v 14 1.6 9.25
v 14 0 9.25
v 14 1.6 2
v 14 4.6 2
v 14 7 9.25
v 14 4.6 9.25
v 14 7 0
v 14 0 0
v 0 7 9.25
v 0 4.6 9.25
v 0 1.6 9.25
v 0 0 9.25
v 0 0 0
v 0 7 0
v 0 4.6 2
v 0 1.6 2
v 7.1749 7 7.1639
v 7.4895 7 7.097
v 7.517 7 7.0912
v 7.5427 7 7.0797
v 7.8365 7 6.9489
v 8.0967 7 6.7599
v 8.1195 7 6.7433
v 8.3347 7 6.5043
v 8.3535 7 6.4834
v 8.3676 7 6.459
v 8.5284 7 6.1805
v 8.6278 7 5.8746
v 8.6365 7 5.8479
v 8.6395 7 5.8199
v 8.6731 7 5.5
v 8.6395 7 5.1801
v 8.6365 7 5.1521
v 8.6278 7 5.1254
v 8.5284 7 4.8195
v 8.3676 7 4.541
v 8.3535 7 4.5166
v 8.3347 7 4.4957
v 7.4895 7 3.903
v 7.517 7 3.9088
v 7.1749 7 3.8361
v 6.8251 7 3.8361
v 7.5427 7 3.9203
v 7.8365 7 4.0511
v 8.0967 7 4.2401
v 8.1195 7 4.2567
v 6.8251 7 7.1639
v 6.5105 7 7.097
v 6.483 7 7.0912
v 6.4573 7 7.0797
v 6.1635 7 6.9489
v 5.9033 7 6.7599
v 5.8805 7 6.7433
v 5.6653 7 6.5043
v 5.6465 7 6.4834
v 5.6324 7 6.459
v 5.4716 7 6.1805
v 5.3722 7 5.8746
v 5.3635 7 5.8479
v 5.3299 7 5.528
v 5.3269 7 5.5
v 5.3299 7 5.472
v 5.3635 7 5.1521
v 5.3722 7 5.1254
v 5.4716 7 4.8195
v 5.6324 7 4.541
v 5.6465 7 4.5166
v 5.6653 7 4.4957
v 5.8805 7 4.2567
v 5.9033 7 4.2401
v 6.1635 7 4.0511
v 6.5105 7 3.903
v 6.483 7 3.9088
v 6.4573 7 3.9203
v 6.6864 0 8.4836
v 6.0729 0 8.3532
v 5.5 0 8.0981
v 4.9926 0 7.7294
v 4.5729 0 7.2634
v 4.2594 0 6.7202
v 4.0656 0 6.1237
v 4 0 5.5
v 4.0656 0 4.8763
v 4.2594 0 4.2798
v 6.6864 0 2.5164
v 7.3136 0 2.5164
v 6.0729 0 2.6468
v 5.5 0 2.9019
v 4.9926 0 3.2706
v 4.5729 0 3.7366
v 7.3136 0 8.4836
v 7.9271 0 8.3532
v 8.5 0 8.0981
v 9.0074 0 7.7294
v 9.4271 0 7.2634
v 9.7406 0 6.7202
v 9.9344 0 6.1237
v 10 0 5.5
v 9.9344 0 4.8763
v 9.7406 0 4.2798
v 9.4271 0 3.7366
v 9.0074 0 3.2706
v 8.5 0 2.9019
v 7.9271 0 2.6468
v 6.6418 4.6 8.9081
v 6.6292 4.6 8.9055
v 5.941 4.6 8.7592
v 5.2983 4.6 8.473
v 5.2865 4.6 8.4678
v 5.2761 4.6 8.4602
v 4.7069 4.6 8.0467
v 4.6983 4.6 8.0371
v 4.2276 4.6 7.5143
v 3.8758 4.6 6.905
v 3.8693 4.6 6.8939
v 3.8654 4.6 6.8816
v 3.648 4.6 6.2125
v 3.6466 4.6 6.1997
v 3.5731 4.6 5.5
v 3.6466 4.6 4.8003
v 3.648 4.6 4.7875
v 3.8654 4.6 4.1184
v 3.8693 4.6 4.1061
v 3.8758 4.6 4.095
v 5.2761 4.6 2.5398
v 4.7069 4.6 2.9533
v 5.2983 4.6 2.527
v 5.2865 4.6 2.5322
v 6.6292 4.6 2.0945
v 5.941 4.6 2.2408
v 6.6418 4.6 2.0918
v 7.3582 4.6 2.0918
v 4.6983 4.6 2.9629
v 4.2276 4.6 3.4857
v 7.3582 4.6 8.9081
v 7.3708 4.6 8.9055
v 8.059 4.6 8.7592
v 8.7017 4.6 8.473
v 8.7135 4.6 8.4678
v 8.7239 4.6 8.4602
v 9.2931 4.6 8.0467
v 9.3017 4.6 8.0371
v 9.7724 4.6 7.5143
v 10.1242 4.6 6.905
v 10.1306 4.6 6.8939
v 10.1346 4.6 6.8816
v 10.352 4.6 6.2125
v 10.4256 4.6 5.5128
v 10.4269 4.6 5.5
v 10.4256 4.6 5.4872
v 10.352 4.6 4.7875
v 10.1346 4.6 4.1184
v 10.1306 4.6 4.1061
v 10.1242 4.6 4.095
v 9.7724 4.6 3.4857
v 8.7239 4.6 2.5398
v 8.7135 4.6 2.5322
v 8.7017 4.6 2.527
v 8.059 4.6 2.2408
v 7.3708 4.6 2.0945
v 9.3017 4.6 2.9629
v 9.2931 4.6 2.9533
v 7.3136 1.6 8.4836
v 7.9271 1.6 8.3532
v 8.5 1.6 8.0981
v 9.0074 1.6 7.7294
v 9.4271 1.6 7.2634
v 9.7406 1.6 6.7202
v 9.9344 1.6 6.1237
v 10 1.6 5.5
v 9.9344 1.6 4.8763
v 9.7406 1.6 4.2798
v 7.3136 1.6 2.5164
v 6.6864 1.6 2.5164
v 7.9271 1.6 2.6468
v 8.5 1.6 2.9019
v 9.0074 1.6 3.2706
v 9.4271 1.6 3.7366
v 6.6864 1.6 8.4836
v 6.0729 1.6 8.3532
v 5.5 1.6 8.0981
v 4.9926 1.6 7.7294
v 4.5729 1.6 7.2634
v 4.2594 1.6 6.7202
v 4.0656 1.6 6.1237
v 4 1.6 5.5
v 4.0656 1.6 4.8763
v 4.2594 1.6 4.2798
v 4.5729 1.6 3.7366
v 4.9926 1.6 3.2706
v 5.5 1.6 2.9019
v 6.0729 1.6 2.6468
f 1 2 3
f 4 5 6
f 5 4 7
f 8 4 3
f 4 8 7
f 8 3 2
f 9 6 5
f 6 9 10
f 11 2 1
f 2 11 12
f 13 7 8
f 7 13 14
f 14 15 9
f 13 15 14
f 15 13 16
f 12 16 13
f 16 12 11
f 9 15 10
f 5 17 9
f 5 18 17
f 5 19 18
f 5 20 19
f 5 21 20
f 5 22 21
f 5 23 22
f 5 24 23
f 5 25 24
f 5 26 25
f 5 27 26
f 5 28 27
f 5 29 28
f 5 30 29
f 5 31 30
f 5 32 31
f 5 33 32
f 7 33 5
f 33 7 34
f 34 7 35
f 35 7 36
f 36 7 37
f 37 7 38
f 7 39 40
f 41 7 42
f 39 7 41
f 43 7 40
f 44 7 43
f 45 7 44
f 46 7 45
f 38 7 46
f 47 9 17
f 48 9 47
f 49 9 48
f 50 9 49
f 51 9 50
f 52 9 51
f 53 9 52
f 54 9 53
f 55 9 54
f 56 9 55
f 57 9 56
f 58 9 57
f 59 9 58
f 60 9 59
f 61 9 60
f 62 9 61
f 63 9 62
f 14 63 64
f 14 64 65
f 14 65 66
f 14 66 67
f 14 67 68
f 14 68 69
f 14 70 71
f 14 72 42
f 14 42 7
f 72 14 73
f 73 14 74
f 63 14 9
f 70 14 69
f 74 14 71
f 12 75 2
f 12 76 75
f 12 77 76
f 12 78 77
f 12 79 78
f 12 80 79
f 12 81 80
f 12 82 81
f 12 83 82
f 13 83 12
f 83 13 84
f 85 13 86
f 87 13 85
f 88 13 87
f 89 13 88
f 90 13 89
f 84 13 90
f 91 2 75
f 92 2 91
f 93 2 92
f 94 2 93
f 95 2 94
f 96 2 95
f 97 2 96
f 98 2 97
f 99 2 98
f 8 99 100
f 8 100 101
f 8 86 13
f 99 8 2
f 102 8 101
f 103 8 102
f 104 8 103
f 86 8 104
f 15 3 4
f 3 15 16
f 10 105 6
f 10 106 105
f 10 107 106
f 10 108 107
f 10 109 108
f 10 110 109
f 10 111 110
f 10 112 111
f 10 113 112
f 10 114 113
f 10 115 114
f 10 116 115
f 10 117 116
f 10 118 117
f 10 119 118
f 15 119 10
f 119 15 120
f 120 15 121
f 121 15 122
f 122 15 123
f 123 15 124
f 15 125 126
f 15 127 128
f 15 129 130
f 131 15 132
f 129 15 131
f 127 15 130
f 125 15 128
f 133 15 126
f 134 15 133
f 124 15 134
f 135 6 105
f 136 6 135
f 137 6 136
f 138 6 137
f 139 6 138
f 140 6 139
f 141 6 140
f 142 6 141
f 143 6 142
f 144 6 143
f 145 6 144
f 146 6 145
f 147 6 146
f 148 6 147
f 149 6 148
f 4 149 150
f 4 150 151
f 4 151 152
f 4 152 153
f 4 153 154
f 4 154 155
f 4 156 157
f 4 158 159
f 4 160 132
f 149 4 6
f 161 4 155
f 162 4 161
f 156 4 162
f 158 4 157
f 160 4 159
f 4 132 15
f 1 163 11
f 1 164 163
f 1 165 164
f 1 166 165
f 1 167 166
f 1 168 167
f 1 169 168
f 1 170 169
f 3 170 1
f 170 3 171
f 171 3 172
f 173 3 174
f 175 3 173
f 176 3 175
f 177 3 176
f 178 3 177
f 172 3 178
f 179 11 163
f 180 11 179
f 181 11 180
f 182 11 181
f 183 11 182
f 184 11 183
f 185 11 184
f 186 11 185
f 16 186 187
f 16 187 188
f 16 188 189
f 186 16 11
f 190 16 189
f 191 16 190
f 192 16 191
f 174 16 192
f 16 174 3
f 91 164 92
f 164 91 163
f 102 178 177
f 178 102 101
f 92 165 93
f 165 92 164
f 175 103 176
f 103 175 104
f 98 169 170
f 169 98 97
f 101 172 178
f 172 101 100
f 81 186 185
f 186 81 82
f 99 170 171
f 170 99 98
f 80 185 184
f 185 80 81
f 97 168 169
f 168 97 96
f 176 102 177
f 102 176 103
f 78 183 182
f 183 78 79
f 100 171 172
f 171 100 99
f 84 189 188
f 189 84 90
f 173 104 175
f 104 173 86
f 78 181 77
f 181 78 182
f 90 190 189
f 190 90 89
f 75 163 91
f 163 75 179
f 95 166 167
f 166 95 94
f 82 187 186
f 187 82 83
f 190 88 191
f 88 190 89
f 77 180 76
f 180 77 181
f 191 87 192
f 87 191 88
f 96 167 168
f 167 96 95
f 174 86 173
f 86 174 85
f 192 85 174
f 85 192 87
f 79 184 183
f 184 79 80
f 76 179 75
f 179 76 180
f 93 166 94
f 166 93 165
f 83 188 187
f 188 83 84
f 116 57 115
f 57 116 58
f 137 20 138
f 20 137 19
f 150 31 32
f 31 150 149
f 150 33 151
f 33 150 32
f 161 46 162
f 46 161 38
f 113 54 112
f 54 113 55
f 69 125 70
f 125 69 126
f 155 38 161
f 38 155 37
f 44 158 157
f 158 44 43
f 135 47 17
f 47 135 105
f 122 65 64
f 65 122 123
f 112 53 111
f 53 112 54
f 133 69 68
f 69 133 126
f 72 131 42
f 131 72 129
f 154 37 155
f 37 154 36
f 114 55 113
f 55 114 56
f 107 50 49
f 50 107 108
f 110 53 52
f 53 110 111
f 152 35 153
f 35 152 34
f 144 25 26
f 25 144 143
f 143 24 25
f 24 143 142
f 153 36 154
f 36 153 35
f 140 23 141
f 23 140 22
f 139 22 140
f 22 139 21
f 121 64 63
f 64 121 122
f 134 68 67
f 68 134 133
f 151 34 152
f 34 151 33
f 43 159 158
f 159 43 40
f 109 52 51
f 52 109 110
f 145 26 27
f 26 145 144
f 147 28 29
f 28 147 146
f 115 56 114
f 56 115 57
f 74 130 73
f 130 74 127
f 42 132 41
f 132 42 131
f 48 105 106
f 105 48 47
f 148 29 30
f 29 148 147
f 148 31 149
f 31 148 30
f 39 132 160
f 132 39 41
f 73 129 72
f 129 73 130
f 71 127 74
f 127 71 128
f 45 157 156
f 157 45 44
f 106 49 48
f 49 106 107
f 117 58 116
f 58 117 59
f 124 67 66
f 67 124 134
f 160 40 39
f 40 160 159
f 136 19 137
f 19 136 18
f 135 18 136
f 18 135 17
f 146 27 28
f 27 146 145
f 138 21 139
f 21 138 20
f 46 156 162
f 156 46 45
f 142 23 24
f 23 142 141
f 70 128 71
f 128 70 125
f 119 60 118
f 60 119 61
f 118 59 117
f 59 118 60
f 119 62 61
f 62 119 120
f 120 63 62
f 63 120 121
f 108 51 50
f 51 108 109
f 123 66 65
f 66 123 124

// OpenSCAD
difference() {
    cube([14, 7, 9.25]);

    translate([-0.1, 1.6, 2])
    cube([15, 3, 9]);
    
    translate([7, -1, 5.5]) 
    rotate([-90, 0, 0])
    cylinder(4, d=6, $fn=30);
    
    translate([7, 4.5, 5.5]) 
    rotate([-90, 0, 0])
    cylinder(2.6, d1=7, d2=3.2, $fn=30);
}
